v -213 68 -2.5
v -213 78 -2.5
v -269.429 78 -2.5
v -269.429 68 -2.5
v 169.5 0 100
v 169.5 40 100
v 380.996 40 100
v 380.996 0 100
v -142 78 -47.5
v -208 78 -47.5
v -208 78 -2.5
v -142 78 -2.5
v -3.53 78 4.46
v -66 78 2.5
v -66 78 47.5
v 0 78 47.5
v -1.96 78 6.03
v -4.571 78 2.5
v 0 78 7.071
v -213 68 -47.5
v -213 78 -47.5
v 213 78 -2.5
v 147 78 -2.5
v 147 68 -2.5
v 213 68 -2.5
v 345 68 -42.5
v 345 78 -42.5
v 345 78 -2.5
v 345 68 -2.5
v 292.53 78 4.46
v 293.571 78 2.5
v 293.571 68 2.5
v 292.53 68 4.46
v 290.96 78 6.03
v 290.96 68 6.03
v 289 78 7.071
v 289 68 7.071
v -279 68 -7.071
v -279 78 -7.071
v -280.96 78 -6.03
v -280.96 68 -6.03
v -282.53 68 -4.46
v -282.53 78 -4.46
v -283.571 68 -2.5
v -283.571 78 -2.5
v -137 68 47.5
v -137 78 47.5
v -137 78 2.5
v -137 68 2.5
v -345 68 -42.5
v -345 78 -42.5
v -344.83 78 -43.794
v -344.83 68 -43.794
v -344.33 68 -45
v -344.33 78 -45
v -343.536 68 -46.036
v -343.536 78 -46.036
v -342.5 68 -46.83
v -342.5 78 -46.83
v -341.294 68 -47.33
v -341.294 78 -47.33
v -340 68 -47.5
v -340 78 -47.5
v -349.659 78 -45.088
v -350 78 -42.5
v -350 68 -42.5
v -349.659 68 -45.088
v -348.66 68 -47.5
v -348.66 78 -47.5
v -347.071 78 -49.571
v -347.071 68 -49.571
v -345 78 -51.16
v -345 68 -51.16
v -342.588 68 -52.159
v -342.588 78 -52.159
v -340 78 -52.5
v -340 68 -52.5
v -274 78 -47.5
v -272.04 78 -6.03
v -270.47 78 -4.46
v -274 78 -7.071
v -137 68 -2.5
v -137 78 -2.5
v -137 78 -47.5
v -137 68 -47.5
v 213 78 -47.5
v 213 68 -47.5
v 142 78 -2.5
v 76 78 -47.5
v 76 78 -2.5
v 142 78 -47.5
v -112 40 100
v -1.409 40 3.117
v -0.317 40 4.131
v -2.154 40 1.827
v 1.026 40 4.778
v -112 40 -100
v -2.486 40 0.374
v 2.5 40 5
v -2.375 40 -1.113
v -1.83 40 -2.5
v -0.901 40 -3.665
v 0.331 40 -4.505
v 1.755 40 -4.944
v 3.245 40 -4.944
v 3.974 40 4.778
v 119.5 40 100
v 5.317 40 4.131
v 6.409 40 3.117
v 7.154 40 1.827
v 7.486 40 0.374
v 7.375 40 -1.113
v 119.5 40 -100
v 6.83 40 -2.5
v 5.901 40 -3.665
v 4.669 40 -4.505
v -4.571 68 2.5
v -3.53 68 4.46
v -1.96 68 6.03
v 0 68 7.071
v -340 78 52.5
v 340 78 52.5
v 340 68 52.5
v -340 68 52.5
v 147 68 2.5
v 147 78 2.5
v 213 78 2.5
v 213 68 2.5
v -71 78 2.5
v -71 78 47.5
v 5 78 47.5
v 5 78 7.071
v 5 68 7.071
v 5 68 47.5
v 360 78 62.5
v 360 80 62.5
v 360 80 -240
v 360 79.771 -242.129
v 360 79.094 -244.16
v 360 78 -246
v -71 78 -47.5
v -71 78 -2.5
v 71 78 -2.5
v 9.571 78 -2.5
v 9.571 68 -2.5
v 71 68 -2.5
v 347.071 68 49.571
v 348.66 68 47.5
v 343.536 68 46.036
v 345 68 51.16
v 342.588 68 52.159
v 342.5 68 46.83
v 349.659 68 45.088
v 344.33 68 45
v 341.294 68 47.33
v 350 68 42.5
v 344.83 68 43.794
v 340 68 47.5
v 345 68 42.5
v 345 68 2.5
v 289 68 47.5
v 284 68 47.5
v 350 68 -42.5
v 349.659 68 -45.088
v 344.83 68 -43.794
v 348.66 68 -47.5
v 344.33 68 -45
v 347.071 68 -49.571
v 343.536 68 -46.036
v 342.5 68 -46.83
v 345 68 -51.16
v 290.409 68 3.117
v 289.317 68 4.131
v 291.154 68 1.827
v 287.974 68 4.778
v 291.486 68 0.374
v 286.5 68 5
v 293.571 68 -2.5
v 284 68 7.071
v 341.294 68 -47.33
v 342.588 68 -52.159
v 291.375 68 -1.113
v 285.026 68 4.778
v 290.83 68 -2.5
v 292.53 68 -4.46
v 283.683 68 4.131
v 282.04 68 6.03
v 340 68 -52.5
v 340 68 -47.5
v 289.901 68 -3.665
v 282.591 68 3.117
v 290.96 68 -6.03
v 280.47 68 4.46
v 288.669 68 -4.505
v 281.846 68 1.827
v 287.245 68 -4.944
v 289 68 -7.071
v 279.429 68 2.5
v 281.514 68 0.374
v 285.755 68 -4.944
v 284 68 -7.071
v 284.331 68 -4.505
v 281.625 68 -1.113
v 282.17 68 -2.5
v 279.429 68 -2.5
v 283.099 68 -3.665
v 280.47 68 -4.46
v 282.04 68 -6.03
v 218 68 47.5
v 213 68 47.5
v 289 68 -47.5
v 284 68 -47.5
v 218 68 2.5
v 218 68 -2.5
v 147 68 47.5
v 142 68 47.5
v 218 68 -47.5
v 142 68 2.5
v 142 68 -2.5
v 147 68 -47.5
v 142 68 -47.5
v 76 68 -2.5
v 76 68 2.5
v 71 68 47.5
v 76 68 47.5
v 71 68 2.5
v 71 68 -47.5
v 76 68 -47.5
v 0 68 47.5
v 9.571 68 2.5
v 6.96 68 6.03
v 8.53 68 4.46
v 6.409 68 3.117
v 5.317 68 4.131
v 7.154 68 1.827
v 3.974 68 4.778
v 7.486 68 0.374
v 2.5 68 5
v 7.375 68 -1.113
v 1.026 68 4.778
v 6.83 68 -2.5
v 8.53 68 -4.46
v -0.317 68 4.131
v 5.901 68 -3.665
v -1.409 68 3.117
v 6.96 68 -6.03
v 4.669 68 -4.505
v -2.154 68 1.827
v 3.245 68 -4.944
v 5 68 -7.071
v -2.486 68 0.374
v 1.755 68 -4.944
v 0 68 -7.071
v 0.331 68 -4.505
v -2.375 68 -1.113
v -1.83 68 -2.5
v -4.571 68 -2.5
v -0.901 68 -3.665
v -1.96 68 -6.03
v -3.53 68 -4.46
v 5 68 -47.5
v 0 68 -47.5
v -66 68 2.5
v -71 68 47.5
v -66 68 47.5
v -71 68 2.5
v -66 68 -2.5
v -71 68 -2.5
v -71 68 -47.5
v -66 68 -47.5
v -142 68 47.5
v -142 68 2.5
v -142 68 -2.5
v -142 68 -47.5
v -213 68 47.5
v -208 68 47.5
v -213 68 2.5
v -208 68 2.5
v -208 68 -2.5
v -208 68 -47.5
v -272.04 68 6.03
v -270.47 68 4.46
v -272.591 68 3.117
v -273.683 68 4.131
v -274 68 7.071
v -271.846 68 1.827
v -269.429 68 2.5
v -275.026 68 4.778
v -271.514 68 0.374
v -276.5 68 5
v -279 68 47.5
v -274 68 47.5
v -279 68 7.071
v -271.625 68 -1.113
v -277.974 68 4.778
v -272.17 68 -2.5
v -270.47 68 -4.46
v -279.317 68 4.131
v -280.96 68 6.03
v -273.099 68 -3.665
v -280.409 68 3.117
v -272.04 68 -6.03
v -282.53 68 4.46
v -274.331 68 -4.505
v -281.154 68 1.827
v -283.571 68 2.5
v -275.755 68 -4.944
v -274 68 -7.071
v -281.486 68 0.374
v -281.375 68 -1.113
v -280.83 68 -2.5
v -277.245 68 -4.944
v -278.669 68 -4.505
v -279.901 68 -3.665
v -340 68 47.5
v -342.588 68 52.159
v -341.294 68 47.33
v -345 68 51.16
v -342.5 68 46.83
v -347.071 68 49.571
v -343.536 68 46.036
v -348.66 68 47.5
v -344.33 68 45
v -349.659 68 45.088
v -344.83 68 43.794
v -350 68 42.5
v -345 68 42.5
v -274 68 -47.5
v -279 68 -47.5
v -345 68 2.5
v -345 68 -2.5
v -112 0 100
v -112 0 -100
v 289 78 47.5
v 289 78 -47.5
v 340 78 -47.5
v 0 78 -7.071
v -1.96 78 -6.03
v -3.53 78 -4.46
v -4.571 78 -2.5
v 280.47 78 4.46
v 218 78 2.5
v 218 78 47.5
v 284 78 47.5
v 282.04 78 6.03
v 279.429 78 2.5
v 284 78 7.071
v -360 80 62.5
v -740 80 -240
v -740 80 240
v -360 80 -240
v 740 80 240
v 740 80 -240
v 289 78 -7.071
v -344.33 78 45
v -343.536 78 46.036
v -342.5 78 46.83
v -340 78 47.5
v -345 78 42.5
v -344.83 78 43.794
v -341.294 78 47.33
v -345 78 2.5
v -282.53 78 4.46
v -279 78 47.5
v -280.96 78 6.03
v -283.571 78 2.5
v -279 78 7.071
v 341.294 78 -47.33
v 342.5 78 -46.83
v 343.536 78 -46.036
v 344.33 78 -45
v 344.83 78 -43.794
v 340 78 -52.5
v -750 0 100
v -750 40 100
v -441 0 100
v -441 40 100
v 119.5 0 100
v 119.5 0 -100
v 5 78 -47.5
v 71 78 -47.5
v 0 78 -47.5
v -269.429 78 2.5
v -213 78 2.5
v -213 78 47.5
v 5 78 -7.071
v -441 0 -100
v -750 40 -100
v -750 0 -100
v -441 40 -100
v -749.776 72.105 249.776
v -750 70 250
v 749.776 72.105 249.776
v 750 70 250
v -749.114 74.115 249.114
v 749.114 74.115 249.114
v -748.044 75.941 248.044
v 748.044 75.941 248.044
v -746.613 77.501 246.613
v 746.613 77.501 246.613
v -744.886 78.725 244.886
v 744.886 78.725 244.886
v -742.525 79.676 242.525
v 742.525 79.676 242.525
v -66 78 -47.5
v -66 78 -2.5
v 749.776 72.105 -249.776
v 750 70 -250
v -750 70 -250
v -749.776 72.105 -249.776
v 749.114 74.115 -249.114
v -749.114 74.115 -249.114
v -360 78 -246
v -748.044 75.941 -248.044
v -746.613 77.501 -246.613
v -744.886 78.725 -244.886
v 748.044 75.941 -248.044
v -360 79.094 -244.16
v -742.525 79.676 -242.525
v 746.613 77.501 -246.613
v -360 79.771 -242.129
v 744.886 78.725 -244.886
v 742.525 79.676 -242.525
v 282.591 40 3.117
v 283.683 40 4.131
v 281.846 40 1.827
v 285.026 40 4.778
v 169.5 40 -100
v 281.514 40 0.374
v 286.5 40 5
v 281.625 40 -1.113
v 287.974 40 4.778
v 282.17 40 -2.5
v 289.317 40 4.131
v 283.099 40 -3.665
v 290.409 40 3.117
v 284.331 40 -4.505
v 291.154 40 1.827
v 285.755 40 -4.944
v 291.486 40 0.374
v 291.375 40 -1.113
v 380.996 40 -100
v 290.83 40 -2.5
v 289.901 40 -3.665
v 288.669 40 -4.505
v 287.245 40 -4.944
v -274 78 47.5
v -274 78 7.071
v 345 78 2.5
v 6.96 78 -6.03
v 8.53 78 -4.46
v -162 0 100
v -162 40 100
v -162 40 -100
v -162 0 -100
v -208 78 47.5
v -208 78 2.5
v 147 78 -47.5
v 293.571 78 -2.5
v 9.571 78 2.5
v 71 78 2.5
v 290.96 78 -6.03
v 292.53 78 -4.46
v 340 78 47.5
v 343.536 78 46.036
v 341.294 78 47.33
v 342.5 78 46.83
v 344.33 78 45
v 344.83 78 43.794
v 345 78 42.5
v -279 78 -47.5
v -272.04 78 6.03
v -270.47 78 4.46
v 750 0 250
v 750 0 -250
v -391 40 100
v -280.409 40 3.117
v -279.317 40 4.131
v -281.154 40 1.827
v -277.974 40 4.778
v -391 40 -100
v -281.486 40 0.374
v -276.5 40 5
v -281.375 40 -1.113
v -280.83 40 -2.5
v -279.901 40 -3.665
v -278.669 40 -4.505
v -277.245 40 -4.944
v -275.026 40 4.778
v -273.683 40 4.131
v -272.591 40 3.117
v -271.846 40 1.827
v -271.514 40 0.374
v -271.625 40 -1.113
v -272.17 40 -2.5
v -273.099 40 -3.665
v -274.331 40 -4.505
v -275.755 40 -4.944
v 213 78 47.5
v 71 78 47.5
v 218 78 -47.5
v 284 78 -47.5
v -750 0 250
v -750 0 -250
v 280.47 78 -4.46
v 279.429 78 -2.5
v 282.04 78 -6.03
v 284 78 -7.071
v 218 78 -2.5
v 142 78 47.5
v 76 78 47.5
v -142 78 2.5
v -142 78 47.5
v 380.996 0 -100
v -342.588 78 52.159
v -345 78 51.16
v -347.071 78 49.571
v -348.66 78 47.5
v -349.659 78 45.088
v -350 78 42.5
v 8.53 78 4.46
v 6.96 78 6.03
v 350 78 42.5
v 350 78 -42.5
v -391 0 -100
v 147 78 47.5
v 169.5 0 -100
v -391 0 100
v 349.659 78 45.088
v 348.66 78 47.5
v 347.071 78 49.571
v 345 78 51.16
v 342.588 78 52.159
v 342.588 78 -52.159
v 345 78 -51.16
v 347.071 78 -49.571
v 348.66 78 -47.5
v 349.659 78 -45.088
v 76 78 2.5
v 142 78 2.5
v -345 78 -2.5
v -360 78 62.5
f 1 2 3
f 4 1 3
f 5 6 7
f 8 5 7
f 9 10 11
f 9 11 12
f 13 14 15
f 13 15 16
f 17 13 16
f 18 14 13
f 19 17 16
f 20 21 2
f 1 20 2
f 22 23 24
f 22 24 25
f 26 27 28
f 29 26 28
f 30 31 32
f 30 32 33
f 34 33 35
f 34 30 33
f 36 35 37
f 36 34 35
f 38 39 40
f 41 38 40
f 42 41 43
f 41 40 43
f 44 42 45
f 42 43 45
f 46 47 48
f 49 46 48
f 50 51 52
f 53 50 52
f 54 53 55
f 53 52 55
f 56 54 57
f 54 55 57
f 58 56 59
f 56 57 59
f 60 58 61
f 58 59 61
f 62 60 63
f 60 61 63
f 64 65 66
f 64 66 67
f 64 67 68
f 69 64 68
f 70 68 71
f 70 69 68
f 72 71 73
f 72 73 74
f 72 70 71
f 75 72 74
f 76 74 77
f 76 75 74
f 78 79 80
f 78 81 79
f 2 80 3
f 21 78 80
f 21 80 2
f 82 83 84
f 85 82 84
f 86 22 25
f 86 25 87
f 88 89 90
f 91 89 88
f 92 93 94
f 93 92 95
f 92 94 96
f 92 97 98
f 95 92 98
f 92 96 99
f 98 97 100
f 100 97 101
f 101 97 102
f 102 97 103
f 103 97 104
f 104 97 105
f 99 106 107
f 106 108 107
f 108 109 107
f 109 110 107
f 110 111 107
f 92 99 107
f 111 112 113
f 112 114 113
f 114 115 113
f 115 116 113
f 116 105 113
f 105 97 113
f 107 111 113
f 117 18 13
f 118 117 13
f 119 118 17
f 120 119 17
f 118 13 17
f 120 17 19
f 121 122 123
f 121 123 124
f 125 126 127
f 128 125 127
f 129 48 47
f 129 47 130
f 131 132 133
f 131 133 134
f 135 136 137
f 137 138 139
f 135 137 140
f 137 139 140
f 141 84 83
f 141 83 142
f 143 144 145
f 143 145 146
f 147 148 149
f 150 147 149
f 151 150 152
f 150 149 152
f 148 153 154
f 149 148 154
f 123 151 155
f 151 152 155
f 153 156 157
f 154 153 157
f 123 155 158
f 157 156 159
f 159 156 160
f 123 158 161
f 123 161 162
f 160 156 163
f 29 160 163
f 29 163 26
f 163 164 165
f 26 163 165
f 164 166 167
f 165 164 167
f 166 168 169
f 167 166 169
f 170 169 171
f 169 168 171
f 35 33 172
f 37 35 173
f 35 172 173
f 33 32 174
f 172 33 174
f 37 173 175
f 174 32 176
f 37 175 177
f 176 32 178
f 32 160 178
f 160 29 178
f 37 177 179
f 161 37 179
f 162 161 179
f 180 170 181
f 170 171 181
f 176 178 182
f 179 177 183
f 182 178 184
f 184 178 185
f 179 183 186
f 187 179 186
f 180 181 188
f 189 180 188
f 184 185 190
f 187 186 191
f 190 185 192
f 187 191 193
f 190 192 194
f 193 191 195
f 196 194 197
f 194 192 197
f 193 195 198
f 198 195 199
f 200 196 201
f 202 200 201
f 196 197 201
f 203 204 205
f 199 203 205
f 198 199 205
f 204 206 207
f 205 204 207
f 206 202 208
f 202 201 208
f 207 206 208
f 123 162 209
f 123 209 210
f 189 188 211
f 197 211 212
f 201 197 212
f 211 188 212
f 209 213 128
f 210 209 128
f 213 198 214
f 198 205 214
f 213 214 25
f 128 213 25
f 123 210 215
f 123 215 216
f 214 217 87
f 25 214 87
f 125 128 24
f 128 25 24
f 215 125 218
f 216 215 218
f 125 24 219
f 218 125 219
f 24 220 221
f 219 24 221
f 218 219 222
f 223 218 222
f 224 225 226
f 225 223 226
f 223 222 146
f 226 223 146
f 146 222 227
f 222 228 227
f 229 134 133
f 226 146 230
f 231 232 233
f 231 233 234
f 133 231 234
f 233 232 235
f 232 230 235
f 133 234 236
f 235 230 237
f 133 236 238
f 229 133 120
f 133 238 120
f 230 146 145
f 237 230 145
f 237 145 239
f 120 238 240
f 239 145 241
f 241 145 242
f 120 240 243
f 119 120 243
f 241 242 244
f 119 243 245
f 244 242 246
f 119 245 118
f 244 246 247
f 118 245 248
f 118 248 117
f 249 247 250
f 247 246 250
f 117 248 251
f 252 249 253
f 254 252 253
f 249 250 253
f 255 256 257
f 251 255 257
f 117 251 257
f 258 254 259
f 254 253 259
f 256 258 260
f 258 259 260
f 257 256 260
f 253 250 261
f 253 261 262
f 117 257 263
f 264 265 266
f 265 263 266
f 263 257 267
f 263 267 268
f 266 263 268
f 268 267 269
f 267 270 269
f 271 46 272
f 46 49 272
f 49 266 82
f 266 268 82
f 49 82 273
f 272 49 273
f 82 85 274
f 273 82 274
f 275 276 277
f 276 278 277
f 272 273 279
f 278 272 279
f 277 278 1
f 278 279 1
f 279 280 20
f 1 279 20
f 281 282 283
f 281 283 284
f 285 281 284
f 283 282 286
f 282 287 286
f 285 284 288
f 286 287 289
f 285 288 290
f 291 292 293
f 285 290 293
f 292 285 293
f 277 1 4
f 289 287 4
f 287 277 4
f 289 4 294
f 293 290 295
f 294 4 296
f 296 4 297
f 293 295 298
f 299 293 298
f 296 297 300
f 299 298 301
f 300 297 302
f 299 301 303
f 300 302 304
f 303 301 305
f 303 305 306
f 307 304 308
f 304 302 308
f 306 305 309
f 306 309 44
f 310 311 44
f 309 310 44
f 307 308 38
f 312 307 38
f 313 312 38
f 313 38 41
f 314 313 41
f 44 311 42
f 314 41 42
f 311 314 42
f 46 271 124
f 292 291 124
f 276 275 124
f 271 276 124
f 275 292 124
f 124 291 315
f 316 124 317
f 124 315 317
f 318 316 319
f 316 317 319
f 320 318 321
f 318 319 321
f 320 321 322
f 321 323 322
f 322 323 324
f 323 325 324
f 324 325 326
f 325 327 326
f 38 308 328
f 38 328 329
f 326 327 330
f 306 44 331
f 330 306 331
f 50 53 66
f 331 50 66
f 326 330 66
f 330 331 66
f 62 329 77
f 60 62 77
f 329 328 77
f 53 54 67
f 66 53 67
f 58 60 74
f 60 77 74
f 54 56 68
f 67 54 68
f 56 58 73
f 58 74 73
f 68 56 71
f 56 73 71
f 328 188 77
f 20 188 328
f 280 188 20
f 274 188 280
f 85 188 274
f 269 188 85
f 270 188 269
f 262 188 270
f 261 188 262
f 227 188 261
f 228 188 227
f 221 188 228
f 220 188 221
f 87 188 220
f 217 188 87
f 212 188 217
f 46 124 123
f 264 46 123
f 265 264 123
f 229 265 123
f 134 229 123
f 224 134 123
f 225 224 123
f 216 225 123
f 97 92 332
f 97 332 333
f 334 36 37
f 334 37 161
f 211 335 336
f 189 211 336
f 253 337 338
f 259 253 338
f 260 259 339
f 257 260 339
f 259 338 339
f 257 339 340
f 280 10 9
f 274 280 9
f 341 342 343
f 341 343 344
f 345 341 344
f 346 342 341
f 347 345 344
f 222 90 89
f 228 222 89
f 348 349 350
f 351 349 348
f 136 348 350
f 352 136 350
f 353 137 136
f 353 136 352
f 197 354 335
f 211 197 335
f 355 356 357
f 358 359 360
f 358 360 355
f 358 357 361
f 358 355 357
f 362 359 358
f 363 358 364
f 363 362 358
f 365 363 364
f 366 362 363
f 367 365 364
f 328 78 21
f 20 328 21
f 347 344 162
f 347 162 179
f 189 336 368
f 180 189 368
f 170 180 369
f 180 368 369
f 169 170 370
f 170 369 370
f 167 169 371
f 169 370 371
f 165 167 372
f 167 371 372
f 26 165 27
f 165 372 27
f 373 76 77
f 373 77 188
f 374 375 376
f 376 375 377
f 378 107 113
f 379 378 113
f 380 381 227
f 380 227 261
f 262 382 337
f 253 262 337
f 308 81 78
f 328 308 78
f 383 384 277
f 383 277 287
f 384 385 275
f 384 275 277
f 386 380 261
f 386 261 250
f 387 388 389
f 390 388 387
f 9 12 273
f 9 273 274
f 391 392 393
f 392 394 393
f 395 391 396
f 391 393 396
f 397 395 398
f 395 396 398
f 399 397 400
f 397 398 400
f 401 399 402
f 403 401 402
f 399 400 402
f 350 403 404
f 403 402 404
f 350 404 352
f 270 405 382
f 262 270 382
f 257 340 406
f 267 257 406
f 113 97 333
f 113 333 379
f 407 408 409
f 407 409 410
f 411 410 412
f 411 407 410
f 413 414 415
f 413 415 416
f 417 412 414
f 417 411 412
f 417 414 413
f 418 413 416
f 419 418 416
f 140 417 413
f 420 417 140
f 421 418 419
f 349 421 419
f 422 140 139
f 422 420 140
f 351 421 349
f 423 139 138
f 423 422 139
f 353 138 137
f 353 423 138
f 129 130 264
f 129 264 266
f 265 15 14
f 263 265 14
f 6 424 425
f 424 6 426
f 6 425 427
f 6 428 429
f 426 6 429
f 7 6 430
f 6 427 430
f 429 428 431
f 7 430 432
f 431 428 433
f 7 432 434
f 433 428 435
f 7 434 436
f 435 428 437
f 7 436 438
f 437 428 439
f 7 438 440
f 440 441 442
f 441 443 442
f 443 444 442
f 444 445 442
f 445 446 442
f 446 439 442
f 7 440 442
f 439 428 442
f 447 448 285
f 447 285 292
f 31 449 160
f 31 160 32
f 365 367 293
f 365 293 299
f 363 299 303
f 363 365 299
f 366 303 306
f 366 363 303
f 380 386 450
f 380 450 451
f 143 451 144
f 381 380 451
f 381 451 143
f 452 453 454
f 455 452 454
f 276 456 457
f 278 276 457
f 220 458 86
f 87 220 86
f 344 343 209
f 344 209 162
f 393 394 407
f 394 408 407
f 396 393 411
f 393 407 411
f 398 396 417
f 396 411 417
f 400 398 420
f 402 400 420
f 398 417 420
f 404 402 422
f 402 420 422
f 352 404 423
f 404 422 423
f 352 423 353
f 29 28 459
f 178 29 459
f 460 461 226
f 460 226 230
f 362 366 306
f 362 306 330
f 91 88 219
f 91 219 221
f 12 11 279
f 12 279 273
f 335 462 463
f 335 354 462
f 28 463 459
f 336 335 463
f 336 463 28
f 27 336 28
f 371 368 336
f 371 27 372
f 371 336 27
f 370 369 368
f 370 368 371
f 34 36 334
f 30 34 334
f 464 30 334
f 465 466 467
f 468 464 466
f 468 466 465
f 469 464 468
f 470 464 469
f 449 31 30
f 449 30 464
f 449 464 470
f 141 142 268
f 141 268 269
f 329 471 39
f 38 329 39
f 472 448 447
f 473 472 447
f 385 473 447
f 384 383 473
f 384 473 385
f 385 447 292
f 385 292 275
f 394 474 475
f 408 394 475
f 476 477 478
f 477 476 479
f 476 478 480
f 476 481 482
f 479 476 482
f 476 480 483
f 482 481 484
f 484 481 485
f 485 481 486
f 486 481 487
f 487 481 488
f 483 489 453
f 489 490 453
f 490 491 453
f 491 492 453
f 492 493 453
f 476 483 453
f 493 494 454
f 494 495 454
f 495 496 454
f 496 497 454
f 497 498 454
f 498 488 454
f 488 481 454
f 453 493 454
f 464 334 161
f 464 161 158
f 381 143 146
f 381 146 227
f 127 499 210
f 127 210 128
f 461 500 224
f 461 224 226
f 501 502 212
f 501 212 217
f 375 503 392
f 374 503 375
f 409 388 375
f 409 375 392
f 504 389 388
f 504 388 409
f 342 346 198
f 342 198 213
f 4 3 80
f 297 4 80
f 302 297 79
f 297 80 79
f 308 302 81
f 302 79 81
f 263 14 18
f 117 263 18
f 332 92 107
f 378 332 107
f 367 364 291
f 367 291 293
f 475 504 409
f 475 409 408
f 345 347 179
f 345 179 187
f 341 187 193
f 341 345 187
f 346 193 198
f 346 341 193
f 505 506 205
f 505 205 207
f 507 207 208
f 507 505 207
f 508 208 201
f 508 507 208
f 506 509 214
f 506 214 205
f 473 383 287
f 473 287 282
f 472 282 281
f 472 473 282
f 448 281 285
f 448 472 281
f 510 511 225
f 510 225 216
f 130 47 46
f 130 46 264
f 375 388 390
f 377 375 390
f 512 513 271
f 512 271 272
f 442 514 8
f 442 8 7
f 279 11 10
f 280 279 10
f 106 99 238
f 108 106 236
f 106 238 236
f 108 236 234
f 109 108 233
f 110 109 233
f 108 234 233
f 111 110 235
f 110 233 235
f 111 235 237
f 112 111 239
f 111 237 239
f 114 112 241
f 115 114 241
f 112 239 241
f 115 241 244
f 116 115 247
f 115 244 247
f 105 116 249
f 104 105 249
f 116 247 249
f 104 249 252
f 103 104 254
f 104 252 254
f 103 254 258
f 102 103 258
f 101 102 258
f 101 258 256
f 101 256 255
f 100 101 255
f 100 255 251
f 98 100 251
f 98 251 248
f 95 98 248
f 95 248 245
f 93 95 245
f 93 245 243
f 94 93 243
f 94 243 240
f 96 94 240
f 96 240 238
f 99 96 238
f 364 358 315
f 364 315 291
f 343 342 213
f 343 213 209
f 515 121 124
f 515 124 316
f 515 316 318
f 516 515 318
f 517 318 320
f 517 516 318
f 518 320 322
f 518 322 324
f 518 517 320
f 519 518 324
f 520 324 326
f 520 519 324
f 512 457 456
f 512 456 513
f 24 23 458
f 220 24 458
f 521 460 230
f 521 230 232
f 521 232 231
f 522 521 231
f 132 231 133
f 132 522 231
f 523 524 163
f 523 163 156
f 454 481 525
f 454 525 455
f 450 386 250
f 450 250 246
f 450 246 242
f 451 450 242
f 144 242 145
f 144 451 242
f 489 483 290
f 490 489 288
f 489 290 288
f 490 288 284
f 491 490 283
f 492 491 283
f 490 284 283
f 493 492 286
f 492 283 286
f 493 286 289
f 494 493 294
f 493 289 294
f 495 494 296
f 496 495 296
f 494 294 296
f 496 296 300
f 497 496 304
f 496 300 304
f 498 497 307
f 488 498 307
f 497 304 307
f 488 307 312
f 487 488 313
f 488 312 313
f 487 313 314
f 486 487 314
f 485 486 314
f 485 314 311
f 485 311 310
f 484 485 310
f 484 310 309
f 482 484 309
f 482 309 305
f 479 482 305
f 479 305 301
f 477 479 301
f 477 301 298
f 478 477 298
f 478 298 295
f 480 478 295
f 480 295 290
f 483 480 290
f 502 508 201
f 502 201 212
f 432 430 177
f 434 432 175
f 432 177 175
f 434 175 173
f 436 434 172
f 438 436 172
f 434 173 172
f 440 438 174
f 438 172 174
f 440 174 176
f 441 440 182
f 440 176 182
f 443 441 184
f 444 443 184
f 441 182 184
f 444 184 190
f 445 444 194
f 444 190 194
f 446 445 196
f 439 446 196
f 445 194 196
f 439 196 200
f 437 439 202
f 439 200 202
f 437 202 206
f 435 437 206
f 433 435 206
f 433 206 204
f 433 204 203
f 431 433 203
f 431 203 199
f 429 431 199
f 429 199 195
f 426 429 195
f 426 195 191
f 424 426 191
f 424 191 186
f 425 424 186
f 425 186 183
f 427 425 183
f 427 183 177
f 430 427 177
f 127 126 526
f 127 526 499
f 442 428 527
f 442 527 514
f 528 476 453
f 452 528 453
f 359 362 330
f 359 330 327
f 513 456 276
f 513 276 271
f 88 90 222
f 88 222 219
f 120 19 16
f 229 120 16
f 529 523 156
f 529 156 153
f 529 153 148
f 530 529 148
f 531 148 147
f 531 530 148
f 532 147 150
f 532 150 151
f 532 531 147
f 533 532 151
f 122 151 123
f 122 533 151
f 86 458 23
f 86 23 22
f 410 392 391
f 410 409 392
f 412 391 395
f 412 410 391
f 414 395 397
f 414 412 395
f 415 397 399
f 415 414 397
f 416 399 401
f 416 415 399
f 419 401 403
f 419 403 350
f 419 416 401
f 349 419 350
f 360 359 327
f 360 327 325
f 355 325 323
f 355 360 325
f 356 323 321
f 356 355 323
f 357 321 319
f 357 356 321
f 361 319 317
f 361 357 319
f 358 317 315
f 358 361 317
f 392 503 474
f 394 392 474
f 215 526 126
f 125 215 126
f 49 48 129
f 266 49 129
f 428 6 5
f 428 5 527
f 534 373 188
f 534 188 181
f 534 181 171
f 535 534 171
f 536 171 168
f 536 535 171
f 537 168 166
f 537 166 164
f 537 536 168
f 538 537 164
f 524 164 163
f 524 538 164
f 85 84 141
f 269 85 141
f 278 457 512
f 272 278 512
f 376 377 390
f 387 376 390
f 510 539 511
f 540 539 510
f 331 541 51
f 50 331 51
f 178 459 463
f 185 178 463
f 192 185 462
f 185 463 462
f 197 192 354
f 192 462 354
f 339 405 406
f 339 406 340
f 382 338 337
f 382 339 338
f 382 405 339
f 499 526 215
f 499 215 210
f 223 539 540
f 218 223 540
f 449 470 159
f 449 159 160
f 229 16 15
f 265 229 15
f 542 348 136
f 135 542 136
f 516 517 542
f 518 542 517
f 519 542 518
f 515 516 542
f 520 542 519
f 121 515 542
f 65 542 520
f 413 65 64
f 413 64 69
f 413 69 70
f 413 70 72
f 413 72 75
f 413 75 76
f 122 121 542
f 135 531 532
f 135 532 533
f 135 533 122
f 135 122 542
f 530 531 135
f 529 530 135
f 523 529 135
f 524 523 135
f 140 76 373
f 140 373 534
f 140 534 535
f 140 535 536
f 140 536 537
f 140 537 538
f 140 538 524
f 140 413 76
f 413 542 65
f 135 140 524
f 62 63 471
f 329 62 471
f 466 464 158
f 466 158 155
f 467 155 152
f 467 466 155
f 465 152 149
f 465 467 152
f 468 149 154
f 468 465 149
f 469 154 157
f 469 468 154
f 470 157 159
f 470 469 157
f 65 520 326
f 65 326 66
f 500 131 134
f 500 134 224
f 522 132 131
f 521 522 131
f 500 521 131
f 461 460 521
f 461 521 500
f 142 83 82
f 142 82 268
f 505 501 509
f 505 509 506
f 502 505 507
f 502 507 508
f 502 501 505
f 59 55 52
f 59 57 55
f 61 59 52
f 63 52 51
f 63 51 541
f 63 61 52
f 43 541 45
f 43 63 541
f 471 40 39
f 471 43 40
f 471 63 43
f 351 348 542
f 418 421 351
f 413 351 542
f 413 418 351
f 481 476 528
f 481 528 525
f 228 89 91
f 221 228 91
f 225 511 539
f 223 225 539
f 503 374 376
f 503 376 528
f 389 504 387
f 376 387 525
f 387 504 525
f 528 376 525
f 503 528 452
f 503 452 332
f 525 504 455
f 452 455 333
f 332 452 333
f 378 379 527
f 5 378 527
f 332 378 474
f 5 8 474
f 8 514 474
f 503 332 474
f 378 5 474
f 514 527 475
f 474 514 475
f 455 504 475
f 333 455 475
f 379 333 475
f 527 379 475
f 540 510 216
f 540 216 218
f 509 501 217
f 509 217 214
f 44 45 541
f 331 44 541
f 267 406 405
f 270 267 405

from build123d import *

# Parameters (mm, degrees)
SKETCH1_W               = 1500
SKETCH1_H               = 500
BOSS_EXTRUDE1_DEPTH     = 80
FILLET2_R               = 10
CUT_EXTRUDE2_START      = 80
SKETCH7_W               = 720
SKETCH7_H               = 439.016917436
CUT_EXTRUDE2_DEPTH      = 2
CUT_EXTRUDE1_START      = 78
SKETCH5_W               = 66
SKETCH5_H               = 45
CUT_EXTRUDE1_DEPTH      = 10
CUT_EXTRUDE3_START      = 80
SKETCH8_R               = 5
CUT_EXTRUDE3_DEPTH      = 875.606821013
CUT_EXTRUDE4_DEPTH      = 100
CUT_EXTRUDE4_DEPTH_BACK = 100
SKETCH9_W               = 1310.383503898
SKETCH9_H               = 40
BOSS_EXTRUDE2_START     = 40
SKETCH10_W              = 50
SKETCH10_H              = 200
BOSS_EXTRUDE2_DEPTH     = 40


with BuildPart() as part:
    # Sketch1 → Boss-Extrude1 (new body)
    with BuildSketch(Plane(origin=(0, 0, 0), x_dir=(1, 0, 0), z_dir=(0, 1, 0))):
        Rectangle(SKETCH1_W, SKETCH1_H)
    extrude(amount=BOSS_EXTRUDE1_DEPTH)

    # Fillet2
    fillet2_edges = [part.edges().sort_by_distance(p)[0] for p in [
        (-750, 80, 0),
        (0, 80, 250),
        (750, 80, 0),
        (0, 80, -250),
    ]]
    fillet(fillet2_edges, radius=FILLET2_R)

    # Sketch7 → Cut-Extrude2 (cut)
    with BuildSketch(Plane(origin=(0, 0, 0), x_dir=(1, 0, 0), z_dir=(0, 1, 0)).offset(CUT_EXTRUDE2_START)):
        with Locations((0, 157.008458718)):
            Rectangle(SKETCH7_W, SKETCH7_H)
    extrude(amount=-CUT_EXTRUDE2_DEPTH, mode=Mode.SUBTRACT)

    # Sketch5 → Cut-Extrude1 (cut)
    with BuildSketch(Plane(origin=(0, 0, 0), x_dir=(1, 0, 0), z_dir=(0, 1, 0)).offset(CUT_EXTRUDE1_START)):
        with BuildLine():
            Line((-340, 52.5), (340, 52.5))
            ThreePointArc((340, 52.5), (347.071067812, 49.571067812), (350, 42.5))
            Line((350, 42.5), (350, -42.5))
            ThreePointArc((350, -42.5), (347.071067812, -49.571067812), (340, -52.5))
            Line((340, -52.5), (-340, -52.5))
            ThreePointArc((-340, -52.5), (-347.071067812, -49.571067812), (-350, -42.5))
            Line((-350, -42.5), (-350, 42.5))
            ThreePointArc((-350, 42.5), (-347.071067812, 49.571067812), (-340, 52.5))
        make_face()
        with BuildLine():
            Line((-340, 47.5), (-279, 47.5))
            Line((-279, 47.5), (-279, 7.071067812))
            ThreePointArc((-279, 7.071067812), (-281.803300859, 5.303300859), (-283.571067812, 2.5))
            Line((-283.571067812, 2.5), (-345, 2.5))
            Line((-345, 2.5), (-345, 42.5))
            ThreePointArc((-345, 42.5), (-343.535533906, 46.035533906), (-340, 47.5))
        make_face(mode=Mode.SUBTRACT)
        with BuildLine():
            Line((-340, -47.5), (-279, -47.5))
            Line((-279, -47.5), (-279, -7.071067812))
            ThreePointArc((-279, -7.071067812), (-281.803300859, -5.303300859), (-283.571067812, -2.5))
            Line((-283.571067812, -2.5), (-345, -2.5))
            Line((-345, -2.5), (-345, -42.5))
            ThreePointArc((-345, -42.5), (-343.535533906, -46.035533906), (-340, -47.5))
        make_face(mode=Mode.SUBTRACT)
        with BuildLine():
            Line((345, 42.5), (345, 2.5))
            Line((345, 2.5), (293.571067812, 2.5))
            ThreePointArc((293.571067812, 2.5), (291.803300859, 5.303300859), (289, 7.071067812))
            Line((289, 7.071067812), (289, 47.5))
            Line((289, 47.5), (340, 47.5))
            ThreePointArc((340, 47.5), (343.535533906, 46.035533906), (345, 42.5))
        make_face(mode=Mode.SUBTRACT)
        with Locations((-175, -25)):
            Rectangle(SKETCH5_W, SKETCH5_H, mode=Mode.SUBTRACT)
        with BuildLine():
            Line((0, 47.5), (0, 7.071067812))
            ThreePointArc((0, 7.071067812), (-2.803300859, 5.303300859), (-4.571067812, 2.5))
            Line((-4.571067812, 2.5), (-66, 2.5))
            Line((-66, 2.5), (-66, 47.5))
            Line((-66, 47.5), (0, 47.5))
        make_face(mode=Mode.SUBTRACT)
        with BuildLine():
            Line((5, 47.5), (5, 7.071067812))
            ThreePointArc((5, 7.071067812), (7.803300859, 5.303300859), (9.571067812, 2.5))
            Line((9.571067812, 2.5), (71, 2.5))
            Line((71, 2.5), (71, 47.5))
            Line((71, 47.5), (5, 47.5))
        make_face(mode=Mode.SUBTRACT)
        with Locations((-104, 25)):
            Rectangle(SKETCH5_W, SKETCH5_H, mode=Mode.SUBTRACT)
        with Locations((109, 25)):
            Rectangle(SKETCH5_W, SKETCH5_H, mode=Mode.SUBTRACT)
        with Locations((180, 25)):
            Rectangle(SKETCH5_W, SKETCH5_H, mode=Mode.SUBTRACT)
        with BuildLine():
            Line((218, 47.5), (218, 2.5))
            Line((218, 2.5), (279.428932188, 2.5))
            ThreePointArc((279.428932188, 2.5), (281.196699141, 5.303300859), (284, 7.071067812))
            Line((284, 7.071067812), (284, 47.5))
            Line((284, 47.5), (218, 47.5))
        make_face(mode=Mode.SUBTRACT)
        with Locations((-175, 25)):
            Rectangle(SKETCH5_W, SKETCH5_H, mode=Mode.SUBTRACT)
        with BuildLine():
            Line((-213, 47.5), (-213, 2.5))
            Line((-213, 2.5), (-269.428932188, 2.5))
            ThreePointArc((-269.428932188, 2.5), (-271.196699141, 5.303300859), (-274, 7.071067812))
            Line((-274, 7.071067812), (-274, 47.5))
            Line((-274, 47.5), (-213, 47.5))
        make_face(mode=Mode.SUBTRACT)
        with BuildLine():
            Line((-274, -7.071067812), (-274, -47.5))
            Line((-274, -47.5), (-213, -47.5))
            Line((-213, -47.5), (-213, -2.5))
            Line((-213, -2.5), (-269.428932188, -2.5))
            ThreePointArc((-269.428932188, -2.5), (-271.196699141, -5.303300859), (-274, -7.071067812))
        make_face(mode=Mode.SUBTRACT)
        with Locations((-104, -25)):
            Rectangle(SKETCH5_W, SKETCH5_H, mode=Mode.SUBTRACT)
        with BuildLine():
            Line((-66, -2.5), (-4.571067812, -2.5))
            ThreePointArc((-4.571067812, -2.5), (-2.803300859, -5.303300859), (0, -7.071067812))
            Line((0, -7.071067812), (0, -47.5))
            Line((0, -47.5), (-66, -47.5))
            Line((-66, -47.5), (-66, -2.5))
        make_face(mode=Mode.SUBTRACT)
        with BuildLine():
            Line((5, -7.071067812), (5, -47.5))
            Line((5, -47.5), (71, -47.5))
            Line((71, -47.5), (71, -2.5))
            Line((71, -2.5), (9.571067812, -2.5))
            ThreePointArc((9.571067812, -2.5), (7.803300859, -5.303300859), (5, -7.071067812))
        make_face(mode=Mode.SUBTRACT)
        with Locations((109, -25)):
            Rectangle(SKETCH5_W, SKETCH5_H, mode=Mode.SUBTRACT)
        with Locations((180, -25)):
            Rectangle(SKETCH5_W, SKETCH5_H, mode=Mode.SUBTRACT)
        with BuildLine():
            Line((218, -2.5), (218, -47.5))
            Line((218, -47.5), (284, -47.5))
            Line((284, -47.5), (284, -7.071067812))
            ThreePointArc((284, -7.071067812), (281.196699141, -5.303300859), (279.428932188, -2.5))
            Line((279.428932188, -2.5), (218, -2.5))
        make_face(mode=Mode.SUBTRACT)
        with BuildLine():
            Line((289, -7.071067812), (289, -47.5))
            Line((289, -47.5), (340, -47.5))
            ThreePointArc((340, -47.5), (343.535533906, -46.035533906), (345, -42.5))
            Line((345, -42.5), (345, -2.5))
            Line((345, -2.5), (293.571067812, -2.5))
            ThreePointArc((293.571067812, -2.5), (291.803300859, -5.303300859), (289, -7.071067812))
        make_face(mode=Mode.SUBTRACT)
    extrude(amount=-CUT_EXTRUDE1_DEPTH, mode=Mode.SUBTRACT)

    # Sketch8 → Cut-Extrude3 (cut, through all)
    with BuildSketch(Plane(origin=(0, 0, 0), x_dir=(1, 0, 0), z_dir=(0, 1, 0)).offset(CUT_EXTRUDE3_START)):
        with Locations(Location((-276.5, 0, 0), (0, 0, 270))):
            Circle(SKETCH8_R)
        with Locations(Location((2.5, 0, 0), (0, 0, 270))):
            Circle(SKETCH8_R)
        with Locations(Location((286.5, 0, 0), (0, 0, 270))):
            Circle(SKETCH8_R)
    extrude(amount=-CUT_EXTRUDE3_DEPTH, mode=Mode.SUBTRACT)

    # Sketch9 → Cut-Extrude4 (cut, two sides: drawn at the far end of the back side and taken through both)
    with BuildSketch(Plane.XY.offset(-CUT_EXTRUDE4_DEPTH_BACK)):
        with Locations((-274.195529116, 20)):
            Rectangle(SKETCH9_W, SKETCH9_H)
    extrude(amount=CUT_EXTRUDE4_DEPTH + CUT_EXTRUDE4_DEPTH_BACK, mode=Mode.SUBTRACT)

    # Sketch10 → Boss-Extrude2 (add)
    with BuildSketch(Plane(origin=(0, 0, 0), x_dir=(1, 0, 0), z_dir=(0, 1, 0)).offset(BOSS_EXTRUDE2_START)):
        with Locations((-137, 0)):
            Rectangle(SKETCH10_W, SKETCH10_H)
        with Locations((144.5, 0)):
            Rectangle(SKETCH10_W, SKETCH10_H)
        with Locations((-416, 0)):
            Rectangle(SKETCH10_W, SKETCH10_H)
    extrude(amount=-BOSS_EXTRUDE2_DEPTH)


solid = part.part
